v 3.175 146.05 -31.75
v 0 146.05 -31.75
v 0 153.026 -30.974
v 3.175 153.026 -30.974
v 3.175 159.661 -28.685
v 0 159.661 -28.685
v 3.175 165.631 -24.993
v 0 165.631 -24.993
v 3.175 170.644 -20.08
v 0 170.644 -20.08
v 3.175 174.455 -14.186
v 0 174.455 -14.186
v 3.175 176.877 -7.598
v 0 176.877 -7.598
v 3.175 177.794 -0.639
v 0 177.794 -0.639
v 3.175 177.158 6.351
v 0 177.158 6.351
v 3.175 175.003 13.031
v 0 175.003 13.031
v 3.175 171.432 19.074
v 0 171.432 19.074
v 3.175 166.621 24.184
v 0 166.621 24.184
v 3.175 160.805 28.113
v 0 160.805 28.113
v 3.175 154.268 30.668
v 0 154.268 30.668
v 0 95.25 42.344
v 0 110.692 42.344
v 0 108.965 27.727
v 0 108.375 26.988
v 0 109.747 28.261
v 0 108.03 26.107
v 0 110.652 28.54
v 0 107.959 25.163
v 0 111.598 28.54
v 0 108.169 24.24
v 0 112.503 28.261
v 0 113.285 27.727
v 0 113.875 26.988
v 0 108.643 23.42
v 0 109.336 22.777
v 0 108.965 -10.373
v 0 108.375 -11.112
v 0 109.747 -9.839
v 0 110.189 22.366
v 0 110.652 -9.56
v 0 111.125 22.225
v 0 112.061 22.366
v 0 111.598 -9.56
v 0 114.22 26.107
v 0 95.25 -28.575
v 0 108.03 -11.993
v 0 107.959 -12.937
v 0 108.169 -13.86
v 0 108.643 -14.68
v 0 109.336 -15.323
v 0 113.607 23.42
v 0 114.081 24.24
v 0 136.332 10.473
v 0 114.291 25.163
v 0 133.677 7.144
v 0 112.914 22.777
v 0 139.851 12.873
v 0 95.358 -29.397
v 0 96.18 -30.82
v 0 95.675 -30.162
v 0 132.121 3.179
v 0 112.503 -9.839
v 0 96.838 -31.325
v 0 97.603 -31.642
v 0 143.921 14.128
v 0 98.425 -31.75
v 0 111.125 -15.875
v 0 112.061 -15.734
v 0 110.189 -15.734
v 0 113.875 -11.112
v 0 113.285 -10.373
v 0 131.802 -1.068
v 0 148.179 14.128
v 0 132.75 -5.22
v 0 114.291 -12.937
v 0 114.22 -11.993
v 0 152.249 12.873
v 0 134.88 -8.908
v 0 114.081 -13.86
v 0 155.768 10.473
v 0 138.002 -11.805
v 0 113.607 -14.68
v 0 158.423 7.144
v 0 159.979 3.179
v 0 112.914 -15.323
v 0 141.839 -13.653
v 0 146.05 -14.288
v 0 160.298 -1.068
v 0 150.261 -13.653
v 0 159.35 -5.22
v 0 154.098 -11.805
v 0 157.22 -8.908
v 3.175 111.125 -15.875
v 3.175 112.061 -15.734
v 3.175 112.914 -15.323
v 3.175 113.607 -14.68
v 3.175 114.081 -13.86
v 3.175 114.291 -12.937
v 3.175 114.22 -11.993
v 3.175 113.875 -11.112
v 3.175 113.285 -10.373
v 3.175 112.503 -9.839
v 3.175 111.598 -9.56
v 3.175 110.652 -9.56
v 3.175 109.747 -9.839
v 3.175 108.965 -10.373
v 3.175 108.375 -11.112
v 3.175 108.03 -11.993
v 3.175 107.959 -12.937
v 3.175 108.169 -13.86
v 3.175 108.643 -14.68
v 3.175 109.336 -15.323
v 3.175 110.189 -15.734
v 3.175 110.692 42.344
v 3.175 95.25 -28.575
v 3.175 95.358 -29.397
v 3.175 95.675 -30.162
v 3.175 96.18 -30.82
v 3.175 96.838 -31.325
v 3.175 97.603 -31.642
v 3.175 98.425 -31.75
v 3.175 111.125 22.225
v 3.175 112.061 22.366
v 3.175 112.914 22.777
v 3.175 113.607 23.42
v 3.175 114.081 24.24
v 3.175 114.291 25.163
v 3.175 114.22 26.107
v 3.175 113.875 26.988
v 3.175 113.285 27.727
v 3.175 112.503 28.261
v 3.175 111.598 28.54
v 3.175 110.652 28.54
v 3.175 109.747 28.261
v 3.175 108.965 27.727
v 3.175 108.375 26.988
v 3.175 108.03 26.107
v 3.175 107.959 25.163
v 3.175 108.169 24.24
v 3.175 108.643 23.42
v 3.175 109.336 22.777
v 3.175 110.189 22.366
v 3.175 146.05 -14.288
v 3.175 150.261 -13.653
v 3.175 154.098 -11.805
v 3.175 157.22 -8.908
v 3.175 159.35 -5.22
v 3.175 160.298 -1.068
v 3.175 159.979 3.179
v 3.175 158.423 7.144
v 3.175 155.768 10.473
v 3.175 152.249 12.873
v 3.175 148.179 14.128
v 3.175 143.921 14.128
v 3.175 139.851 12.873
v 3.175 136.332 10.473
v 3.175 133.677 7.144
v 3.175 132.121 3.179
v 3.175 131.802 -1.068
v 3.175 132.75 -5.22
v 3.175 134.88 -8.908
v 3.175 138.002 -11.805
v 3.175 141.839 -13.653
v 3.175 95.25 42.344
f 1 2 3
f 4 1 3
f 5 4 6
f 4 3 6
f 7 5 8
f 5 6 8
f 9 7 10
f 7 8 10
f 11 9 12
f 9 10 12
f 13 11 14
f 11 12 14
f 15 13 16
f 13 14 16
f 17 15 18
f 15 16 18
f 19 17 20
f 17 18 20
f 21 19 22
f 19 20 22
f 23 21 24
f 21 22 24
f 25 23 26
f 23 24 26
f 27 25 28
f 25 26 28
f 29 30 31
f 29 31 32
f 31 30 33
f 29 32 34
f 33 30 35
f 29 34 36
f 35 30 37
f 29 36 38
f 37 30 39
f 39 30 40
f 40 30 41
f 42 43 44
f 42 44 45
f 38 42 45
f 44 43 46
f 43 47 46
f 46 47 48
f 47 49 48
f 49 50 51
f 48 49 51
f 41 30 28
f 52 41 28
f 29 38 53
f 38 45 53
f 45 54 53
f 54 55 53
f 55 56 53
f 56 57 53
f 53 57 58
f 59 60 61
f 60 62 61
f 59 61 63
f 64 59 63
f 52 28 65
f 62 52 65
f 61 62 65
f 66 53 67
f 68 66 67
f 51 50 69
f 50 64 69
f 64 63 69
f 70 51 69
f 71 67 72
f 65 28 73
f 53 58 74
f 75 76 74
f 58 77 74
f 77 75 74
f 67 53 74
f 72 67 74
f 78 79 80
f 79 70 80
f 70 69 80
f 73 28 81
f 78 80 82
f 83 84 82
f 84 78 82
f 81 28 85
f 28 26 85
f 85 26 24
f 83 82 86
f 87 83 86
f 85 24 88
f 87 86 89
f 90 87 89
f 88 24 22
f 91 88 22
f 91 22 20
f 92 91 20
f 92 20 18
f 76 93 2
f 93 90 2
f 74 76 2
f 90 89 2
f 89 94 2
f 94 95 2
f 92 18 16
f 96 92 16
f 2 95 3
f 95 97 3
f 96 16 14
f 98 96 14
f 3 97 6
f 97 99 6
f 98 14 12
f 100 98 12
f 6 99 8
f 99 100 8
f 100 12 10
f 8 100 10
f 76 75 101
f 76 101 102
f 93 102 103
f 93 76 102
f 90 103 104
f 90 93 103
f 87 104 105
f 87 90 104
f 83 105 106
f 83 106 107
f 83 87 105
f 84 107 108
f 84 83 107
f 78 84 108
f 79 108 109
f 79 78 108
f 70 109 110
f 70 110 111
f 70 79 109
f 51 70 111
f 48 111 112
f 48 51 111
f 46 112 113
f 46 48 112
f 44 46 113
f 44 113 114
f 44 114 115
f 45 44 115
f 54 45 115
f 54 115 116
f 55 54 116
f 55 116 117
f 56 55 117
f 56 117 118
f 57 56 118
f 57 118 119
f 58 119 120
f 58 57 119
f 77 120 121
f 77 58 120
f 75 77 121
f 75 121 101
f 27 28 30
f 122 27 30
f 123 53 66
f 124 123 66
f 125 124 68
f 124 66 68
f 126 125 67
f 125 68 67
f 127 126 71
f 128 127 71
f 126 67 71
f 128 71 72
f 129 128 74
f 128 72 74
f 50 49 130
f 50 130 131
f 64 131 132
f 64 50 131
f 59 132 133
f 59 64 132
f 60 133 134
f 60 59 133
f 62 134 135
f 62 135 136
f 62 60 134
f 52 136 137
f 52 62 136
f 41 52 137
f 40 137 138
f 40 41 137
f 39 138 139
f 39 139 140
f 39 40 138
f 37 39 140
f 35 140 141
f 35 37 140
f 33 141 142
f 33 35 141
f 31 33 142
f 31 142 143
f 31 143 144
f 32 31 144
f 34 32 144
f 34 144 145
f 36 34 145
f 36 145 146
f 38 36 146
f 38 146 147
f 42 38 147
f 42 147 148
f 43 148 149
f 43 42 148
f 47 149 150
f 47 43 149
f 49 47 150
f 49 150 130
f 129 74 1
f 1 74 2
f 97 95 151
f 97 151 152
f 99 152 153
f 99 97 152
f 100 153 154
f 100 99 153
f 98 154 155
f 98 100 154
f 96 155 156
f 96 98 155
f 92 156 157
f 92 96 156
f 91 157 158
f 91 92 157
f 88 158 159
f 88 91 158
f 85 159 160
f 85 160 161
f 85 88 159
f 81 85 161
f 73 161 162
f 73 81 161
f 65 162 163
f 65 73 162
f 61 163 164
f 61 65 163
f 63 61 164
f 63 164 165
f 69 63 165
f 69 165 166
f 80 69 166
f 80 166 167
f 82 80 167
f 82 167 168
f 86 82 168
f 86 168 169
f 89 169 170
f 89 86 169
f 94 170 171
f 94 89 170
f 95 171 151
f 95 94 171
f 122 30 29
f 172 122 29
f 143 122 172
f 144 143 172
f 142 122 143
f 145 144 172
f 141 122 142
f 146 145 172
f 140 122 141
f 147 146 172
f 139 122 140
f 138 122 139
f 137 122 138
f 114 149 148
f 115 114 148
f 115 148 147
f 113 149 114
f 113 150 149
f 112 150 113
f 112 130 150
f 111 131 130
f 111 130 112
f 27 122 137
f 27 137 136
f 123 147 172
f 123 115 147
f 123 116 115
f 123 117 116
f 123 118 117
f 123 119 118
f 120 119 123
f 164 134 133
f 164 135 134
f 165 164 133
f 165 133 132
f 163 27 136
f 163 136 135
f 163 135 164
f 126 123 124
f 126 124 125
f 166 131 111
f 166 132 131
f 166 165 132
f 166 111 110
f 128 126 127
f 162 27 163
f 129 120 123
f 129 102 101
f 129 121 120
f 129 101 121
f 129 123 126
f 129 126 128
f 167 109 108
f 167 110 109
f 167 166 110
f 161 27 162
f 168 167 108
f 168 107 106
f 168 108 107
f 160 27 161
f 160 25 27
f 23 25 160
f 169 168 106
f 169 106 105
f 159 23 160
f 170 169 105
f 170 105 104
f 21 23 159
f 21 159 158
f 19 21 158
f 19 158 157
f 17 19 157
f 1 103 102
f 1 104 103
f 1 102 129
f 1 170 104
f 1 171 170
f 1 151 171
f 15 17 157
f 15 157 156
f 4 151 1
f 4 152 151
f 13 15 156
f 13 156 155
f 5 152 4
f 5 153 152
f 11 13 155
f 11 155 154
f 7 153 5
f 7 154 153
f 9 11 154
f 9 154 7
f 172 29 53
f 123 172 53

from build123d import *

# Parameters (mm, degrees)
SKETCH2_R           = 14.2875
SKETCH2_R_2         = 3.175
BOSS_EXTRUDE1_DEPTH = 3.175


with BuildPart() as part:
    # Sketch2 → Boss-Extrude1 (new body)
    with BuildSketch(Plane(origin=(0, 0, 0), x_dir=(0, 0, -1), z_dir=(1, 0, 0))):
        with BuildLine():
            Line((-30.668144985, 154.267504682), (-42.344097145, 110.692257994))
            Line((-42.344097145, 110.692257994), (-42.344097145, 95.25))
            Line((-42.344097145, 95.25), (28.575, 95.25))
            ThreePointArc((28.575, 95.25), (30.82006403, 96.17993597), (31.75, 98.425))
            Line((31.75, 98.425), (31.75, 110.608066701))
            Line((31.75, 110.608066701), (31.75, 146.05))
            ThreePointArc((31.75, 146.05), (4.144206603, 177.528374349), (-30.668144985, 154.267504682))
        make_face()
        with Locations((0, 146.05)):
            Circle(SKETCH2_R, mode=Mode.SUBTRACT)
        with Locations((-25.4, 111.125)):
            Circle(SKETCH2_R_2, mode=Mode.SUBTRACT)
        with Locations((12.7, 111.125)):
            Circle(SKETCH2_R_2, mode=Mode.SUBTRACT)
    extrude(amount=BOSS_EXTRUDE1_DEPTH)


solid = part.part
